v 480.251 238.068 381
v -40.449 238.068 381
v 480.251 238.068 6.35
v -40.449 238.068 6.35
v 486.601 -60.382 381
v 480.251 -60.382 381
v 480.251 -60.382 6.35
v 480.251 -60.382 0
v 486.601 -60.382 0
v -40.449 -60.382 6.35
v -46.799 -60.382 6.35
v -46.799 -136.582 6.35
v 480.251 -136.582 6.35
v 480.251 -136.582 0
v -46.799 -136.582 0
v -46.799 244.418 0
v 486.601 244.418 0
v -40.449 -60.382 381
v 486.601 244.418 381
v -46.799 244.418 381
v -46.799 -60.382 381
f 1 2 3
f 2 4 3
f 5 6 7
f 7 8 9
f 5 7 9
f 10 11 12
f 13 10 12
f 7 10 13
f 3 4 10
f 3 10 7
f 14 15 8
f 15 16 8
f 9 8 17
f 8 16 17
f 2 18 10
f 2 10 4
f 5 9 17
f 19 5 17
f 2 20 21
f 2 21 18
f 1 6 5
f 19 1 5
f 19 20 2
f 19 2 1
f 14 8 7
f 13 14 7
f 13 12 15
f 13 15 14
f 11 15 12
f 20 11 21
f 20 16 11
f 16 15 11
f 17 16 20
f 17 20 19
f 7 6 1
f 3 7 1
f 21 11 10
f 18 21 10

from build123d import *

# Parameters (mm, degrees)
F0_W     = 533.4
F0_H     = 304.8
F1_DEPTH = 381
F2_T     = -6.35
F3_W     = 527.05
F3_H     = 6.35
F4_DEPTH = 76.2


with BuildPart() as f1:
    # F0 (on Top) → F1 (new body)
    with BuildSketch(Plane.XY):
        with Locations((219.900687, 92.017783)):
            Rectangle(F0_W, F0_H)
    extrude(amount=F1_DEPTH)

    # F2
    f2_openings = [f1.faces().sort_by_distance(p)[0] for p in [
        (219.900687, 92.017783, 381),
        (219.900687, -60.382217, 190.5),
    ]]
    offset(amount=F2_T, openings=f2_openings)

    # F3 (on face) → F4 (join)
    with BuildSketch(Plane.XZ.offset(60.382217)):
        with Locations((216.725687, 3.175)):
            Rectangle(F3_W, F3_H)
    extrude(amount=F4_DEPTH)


solid = f1.part
